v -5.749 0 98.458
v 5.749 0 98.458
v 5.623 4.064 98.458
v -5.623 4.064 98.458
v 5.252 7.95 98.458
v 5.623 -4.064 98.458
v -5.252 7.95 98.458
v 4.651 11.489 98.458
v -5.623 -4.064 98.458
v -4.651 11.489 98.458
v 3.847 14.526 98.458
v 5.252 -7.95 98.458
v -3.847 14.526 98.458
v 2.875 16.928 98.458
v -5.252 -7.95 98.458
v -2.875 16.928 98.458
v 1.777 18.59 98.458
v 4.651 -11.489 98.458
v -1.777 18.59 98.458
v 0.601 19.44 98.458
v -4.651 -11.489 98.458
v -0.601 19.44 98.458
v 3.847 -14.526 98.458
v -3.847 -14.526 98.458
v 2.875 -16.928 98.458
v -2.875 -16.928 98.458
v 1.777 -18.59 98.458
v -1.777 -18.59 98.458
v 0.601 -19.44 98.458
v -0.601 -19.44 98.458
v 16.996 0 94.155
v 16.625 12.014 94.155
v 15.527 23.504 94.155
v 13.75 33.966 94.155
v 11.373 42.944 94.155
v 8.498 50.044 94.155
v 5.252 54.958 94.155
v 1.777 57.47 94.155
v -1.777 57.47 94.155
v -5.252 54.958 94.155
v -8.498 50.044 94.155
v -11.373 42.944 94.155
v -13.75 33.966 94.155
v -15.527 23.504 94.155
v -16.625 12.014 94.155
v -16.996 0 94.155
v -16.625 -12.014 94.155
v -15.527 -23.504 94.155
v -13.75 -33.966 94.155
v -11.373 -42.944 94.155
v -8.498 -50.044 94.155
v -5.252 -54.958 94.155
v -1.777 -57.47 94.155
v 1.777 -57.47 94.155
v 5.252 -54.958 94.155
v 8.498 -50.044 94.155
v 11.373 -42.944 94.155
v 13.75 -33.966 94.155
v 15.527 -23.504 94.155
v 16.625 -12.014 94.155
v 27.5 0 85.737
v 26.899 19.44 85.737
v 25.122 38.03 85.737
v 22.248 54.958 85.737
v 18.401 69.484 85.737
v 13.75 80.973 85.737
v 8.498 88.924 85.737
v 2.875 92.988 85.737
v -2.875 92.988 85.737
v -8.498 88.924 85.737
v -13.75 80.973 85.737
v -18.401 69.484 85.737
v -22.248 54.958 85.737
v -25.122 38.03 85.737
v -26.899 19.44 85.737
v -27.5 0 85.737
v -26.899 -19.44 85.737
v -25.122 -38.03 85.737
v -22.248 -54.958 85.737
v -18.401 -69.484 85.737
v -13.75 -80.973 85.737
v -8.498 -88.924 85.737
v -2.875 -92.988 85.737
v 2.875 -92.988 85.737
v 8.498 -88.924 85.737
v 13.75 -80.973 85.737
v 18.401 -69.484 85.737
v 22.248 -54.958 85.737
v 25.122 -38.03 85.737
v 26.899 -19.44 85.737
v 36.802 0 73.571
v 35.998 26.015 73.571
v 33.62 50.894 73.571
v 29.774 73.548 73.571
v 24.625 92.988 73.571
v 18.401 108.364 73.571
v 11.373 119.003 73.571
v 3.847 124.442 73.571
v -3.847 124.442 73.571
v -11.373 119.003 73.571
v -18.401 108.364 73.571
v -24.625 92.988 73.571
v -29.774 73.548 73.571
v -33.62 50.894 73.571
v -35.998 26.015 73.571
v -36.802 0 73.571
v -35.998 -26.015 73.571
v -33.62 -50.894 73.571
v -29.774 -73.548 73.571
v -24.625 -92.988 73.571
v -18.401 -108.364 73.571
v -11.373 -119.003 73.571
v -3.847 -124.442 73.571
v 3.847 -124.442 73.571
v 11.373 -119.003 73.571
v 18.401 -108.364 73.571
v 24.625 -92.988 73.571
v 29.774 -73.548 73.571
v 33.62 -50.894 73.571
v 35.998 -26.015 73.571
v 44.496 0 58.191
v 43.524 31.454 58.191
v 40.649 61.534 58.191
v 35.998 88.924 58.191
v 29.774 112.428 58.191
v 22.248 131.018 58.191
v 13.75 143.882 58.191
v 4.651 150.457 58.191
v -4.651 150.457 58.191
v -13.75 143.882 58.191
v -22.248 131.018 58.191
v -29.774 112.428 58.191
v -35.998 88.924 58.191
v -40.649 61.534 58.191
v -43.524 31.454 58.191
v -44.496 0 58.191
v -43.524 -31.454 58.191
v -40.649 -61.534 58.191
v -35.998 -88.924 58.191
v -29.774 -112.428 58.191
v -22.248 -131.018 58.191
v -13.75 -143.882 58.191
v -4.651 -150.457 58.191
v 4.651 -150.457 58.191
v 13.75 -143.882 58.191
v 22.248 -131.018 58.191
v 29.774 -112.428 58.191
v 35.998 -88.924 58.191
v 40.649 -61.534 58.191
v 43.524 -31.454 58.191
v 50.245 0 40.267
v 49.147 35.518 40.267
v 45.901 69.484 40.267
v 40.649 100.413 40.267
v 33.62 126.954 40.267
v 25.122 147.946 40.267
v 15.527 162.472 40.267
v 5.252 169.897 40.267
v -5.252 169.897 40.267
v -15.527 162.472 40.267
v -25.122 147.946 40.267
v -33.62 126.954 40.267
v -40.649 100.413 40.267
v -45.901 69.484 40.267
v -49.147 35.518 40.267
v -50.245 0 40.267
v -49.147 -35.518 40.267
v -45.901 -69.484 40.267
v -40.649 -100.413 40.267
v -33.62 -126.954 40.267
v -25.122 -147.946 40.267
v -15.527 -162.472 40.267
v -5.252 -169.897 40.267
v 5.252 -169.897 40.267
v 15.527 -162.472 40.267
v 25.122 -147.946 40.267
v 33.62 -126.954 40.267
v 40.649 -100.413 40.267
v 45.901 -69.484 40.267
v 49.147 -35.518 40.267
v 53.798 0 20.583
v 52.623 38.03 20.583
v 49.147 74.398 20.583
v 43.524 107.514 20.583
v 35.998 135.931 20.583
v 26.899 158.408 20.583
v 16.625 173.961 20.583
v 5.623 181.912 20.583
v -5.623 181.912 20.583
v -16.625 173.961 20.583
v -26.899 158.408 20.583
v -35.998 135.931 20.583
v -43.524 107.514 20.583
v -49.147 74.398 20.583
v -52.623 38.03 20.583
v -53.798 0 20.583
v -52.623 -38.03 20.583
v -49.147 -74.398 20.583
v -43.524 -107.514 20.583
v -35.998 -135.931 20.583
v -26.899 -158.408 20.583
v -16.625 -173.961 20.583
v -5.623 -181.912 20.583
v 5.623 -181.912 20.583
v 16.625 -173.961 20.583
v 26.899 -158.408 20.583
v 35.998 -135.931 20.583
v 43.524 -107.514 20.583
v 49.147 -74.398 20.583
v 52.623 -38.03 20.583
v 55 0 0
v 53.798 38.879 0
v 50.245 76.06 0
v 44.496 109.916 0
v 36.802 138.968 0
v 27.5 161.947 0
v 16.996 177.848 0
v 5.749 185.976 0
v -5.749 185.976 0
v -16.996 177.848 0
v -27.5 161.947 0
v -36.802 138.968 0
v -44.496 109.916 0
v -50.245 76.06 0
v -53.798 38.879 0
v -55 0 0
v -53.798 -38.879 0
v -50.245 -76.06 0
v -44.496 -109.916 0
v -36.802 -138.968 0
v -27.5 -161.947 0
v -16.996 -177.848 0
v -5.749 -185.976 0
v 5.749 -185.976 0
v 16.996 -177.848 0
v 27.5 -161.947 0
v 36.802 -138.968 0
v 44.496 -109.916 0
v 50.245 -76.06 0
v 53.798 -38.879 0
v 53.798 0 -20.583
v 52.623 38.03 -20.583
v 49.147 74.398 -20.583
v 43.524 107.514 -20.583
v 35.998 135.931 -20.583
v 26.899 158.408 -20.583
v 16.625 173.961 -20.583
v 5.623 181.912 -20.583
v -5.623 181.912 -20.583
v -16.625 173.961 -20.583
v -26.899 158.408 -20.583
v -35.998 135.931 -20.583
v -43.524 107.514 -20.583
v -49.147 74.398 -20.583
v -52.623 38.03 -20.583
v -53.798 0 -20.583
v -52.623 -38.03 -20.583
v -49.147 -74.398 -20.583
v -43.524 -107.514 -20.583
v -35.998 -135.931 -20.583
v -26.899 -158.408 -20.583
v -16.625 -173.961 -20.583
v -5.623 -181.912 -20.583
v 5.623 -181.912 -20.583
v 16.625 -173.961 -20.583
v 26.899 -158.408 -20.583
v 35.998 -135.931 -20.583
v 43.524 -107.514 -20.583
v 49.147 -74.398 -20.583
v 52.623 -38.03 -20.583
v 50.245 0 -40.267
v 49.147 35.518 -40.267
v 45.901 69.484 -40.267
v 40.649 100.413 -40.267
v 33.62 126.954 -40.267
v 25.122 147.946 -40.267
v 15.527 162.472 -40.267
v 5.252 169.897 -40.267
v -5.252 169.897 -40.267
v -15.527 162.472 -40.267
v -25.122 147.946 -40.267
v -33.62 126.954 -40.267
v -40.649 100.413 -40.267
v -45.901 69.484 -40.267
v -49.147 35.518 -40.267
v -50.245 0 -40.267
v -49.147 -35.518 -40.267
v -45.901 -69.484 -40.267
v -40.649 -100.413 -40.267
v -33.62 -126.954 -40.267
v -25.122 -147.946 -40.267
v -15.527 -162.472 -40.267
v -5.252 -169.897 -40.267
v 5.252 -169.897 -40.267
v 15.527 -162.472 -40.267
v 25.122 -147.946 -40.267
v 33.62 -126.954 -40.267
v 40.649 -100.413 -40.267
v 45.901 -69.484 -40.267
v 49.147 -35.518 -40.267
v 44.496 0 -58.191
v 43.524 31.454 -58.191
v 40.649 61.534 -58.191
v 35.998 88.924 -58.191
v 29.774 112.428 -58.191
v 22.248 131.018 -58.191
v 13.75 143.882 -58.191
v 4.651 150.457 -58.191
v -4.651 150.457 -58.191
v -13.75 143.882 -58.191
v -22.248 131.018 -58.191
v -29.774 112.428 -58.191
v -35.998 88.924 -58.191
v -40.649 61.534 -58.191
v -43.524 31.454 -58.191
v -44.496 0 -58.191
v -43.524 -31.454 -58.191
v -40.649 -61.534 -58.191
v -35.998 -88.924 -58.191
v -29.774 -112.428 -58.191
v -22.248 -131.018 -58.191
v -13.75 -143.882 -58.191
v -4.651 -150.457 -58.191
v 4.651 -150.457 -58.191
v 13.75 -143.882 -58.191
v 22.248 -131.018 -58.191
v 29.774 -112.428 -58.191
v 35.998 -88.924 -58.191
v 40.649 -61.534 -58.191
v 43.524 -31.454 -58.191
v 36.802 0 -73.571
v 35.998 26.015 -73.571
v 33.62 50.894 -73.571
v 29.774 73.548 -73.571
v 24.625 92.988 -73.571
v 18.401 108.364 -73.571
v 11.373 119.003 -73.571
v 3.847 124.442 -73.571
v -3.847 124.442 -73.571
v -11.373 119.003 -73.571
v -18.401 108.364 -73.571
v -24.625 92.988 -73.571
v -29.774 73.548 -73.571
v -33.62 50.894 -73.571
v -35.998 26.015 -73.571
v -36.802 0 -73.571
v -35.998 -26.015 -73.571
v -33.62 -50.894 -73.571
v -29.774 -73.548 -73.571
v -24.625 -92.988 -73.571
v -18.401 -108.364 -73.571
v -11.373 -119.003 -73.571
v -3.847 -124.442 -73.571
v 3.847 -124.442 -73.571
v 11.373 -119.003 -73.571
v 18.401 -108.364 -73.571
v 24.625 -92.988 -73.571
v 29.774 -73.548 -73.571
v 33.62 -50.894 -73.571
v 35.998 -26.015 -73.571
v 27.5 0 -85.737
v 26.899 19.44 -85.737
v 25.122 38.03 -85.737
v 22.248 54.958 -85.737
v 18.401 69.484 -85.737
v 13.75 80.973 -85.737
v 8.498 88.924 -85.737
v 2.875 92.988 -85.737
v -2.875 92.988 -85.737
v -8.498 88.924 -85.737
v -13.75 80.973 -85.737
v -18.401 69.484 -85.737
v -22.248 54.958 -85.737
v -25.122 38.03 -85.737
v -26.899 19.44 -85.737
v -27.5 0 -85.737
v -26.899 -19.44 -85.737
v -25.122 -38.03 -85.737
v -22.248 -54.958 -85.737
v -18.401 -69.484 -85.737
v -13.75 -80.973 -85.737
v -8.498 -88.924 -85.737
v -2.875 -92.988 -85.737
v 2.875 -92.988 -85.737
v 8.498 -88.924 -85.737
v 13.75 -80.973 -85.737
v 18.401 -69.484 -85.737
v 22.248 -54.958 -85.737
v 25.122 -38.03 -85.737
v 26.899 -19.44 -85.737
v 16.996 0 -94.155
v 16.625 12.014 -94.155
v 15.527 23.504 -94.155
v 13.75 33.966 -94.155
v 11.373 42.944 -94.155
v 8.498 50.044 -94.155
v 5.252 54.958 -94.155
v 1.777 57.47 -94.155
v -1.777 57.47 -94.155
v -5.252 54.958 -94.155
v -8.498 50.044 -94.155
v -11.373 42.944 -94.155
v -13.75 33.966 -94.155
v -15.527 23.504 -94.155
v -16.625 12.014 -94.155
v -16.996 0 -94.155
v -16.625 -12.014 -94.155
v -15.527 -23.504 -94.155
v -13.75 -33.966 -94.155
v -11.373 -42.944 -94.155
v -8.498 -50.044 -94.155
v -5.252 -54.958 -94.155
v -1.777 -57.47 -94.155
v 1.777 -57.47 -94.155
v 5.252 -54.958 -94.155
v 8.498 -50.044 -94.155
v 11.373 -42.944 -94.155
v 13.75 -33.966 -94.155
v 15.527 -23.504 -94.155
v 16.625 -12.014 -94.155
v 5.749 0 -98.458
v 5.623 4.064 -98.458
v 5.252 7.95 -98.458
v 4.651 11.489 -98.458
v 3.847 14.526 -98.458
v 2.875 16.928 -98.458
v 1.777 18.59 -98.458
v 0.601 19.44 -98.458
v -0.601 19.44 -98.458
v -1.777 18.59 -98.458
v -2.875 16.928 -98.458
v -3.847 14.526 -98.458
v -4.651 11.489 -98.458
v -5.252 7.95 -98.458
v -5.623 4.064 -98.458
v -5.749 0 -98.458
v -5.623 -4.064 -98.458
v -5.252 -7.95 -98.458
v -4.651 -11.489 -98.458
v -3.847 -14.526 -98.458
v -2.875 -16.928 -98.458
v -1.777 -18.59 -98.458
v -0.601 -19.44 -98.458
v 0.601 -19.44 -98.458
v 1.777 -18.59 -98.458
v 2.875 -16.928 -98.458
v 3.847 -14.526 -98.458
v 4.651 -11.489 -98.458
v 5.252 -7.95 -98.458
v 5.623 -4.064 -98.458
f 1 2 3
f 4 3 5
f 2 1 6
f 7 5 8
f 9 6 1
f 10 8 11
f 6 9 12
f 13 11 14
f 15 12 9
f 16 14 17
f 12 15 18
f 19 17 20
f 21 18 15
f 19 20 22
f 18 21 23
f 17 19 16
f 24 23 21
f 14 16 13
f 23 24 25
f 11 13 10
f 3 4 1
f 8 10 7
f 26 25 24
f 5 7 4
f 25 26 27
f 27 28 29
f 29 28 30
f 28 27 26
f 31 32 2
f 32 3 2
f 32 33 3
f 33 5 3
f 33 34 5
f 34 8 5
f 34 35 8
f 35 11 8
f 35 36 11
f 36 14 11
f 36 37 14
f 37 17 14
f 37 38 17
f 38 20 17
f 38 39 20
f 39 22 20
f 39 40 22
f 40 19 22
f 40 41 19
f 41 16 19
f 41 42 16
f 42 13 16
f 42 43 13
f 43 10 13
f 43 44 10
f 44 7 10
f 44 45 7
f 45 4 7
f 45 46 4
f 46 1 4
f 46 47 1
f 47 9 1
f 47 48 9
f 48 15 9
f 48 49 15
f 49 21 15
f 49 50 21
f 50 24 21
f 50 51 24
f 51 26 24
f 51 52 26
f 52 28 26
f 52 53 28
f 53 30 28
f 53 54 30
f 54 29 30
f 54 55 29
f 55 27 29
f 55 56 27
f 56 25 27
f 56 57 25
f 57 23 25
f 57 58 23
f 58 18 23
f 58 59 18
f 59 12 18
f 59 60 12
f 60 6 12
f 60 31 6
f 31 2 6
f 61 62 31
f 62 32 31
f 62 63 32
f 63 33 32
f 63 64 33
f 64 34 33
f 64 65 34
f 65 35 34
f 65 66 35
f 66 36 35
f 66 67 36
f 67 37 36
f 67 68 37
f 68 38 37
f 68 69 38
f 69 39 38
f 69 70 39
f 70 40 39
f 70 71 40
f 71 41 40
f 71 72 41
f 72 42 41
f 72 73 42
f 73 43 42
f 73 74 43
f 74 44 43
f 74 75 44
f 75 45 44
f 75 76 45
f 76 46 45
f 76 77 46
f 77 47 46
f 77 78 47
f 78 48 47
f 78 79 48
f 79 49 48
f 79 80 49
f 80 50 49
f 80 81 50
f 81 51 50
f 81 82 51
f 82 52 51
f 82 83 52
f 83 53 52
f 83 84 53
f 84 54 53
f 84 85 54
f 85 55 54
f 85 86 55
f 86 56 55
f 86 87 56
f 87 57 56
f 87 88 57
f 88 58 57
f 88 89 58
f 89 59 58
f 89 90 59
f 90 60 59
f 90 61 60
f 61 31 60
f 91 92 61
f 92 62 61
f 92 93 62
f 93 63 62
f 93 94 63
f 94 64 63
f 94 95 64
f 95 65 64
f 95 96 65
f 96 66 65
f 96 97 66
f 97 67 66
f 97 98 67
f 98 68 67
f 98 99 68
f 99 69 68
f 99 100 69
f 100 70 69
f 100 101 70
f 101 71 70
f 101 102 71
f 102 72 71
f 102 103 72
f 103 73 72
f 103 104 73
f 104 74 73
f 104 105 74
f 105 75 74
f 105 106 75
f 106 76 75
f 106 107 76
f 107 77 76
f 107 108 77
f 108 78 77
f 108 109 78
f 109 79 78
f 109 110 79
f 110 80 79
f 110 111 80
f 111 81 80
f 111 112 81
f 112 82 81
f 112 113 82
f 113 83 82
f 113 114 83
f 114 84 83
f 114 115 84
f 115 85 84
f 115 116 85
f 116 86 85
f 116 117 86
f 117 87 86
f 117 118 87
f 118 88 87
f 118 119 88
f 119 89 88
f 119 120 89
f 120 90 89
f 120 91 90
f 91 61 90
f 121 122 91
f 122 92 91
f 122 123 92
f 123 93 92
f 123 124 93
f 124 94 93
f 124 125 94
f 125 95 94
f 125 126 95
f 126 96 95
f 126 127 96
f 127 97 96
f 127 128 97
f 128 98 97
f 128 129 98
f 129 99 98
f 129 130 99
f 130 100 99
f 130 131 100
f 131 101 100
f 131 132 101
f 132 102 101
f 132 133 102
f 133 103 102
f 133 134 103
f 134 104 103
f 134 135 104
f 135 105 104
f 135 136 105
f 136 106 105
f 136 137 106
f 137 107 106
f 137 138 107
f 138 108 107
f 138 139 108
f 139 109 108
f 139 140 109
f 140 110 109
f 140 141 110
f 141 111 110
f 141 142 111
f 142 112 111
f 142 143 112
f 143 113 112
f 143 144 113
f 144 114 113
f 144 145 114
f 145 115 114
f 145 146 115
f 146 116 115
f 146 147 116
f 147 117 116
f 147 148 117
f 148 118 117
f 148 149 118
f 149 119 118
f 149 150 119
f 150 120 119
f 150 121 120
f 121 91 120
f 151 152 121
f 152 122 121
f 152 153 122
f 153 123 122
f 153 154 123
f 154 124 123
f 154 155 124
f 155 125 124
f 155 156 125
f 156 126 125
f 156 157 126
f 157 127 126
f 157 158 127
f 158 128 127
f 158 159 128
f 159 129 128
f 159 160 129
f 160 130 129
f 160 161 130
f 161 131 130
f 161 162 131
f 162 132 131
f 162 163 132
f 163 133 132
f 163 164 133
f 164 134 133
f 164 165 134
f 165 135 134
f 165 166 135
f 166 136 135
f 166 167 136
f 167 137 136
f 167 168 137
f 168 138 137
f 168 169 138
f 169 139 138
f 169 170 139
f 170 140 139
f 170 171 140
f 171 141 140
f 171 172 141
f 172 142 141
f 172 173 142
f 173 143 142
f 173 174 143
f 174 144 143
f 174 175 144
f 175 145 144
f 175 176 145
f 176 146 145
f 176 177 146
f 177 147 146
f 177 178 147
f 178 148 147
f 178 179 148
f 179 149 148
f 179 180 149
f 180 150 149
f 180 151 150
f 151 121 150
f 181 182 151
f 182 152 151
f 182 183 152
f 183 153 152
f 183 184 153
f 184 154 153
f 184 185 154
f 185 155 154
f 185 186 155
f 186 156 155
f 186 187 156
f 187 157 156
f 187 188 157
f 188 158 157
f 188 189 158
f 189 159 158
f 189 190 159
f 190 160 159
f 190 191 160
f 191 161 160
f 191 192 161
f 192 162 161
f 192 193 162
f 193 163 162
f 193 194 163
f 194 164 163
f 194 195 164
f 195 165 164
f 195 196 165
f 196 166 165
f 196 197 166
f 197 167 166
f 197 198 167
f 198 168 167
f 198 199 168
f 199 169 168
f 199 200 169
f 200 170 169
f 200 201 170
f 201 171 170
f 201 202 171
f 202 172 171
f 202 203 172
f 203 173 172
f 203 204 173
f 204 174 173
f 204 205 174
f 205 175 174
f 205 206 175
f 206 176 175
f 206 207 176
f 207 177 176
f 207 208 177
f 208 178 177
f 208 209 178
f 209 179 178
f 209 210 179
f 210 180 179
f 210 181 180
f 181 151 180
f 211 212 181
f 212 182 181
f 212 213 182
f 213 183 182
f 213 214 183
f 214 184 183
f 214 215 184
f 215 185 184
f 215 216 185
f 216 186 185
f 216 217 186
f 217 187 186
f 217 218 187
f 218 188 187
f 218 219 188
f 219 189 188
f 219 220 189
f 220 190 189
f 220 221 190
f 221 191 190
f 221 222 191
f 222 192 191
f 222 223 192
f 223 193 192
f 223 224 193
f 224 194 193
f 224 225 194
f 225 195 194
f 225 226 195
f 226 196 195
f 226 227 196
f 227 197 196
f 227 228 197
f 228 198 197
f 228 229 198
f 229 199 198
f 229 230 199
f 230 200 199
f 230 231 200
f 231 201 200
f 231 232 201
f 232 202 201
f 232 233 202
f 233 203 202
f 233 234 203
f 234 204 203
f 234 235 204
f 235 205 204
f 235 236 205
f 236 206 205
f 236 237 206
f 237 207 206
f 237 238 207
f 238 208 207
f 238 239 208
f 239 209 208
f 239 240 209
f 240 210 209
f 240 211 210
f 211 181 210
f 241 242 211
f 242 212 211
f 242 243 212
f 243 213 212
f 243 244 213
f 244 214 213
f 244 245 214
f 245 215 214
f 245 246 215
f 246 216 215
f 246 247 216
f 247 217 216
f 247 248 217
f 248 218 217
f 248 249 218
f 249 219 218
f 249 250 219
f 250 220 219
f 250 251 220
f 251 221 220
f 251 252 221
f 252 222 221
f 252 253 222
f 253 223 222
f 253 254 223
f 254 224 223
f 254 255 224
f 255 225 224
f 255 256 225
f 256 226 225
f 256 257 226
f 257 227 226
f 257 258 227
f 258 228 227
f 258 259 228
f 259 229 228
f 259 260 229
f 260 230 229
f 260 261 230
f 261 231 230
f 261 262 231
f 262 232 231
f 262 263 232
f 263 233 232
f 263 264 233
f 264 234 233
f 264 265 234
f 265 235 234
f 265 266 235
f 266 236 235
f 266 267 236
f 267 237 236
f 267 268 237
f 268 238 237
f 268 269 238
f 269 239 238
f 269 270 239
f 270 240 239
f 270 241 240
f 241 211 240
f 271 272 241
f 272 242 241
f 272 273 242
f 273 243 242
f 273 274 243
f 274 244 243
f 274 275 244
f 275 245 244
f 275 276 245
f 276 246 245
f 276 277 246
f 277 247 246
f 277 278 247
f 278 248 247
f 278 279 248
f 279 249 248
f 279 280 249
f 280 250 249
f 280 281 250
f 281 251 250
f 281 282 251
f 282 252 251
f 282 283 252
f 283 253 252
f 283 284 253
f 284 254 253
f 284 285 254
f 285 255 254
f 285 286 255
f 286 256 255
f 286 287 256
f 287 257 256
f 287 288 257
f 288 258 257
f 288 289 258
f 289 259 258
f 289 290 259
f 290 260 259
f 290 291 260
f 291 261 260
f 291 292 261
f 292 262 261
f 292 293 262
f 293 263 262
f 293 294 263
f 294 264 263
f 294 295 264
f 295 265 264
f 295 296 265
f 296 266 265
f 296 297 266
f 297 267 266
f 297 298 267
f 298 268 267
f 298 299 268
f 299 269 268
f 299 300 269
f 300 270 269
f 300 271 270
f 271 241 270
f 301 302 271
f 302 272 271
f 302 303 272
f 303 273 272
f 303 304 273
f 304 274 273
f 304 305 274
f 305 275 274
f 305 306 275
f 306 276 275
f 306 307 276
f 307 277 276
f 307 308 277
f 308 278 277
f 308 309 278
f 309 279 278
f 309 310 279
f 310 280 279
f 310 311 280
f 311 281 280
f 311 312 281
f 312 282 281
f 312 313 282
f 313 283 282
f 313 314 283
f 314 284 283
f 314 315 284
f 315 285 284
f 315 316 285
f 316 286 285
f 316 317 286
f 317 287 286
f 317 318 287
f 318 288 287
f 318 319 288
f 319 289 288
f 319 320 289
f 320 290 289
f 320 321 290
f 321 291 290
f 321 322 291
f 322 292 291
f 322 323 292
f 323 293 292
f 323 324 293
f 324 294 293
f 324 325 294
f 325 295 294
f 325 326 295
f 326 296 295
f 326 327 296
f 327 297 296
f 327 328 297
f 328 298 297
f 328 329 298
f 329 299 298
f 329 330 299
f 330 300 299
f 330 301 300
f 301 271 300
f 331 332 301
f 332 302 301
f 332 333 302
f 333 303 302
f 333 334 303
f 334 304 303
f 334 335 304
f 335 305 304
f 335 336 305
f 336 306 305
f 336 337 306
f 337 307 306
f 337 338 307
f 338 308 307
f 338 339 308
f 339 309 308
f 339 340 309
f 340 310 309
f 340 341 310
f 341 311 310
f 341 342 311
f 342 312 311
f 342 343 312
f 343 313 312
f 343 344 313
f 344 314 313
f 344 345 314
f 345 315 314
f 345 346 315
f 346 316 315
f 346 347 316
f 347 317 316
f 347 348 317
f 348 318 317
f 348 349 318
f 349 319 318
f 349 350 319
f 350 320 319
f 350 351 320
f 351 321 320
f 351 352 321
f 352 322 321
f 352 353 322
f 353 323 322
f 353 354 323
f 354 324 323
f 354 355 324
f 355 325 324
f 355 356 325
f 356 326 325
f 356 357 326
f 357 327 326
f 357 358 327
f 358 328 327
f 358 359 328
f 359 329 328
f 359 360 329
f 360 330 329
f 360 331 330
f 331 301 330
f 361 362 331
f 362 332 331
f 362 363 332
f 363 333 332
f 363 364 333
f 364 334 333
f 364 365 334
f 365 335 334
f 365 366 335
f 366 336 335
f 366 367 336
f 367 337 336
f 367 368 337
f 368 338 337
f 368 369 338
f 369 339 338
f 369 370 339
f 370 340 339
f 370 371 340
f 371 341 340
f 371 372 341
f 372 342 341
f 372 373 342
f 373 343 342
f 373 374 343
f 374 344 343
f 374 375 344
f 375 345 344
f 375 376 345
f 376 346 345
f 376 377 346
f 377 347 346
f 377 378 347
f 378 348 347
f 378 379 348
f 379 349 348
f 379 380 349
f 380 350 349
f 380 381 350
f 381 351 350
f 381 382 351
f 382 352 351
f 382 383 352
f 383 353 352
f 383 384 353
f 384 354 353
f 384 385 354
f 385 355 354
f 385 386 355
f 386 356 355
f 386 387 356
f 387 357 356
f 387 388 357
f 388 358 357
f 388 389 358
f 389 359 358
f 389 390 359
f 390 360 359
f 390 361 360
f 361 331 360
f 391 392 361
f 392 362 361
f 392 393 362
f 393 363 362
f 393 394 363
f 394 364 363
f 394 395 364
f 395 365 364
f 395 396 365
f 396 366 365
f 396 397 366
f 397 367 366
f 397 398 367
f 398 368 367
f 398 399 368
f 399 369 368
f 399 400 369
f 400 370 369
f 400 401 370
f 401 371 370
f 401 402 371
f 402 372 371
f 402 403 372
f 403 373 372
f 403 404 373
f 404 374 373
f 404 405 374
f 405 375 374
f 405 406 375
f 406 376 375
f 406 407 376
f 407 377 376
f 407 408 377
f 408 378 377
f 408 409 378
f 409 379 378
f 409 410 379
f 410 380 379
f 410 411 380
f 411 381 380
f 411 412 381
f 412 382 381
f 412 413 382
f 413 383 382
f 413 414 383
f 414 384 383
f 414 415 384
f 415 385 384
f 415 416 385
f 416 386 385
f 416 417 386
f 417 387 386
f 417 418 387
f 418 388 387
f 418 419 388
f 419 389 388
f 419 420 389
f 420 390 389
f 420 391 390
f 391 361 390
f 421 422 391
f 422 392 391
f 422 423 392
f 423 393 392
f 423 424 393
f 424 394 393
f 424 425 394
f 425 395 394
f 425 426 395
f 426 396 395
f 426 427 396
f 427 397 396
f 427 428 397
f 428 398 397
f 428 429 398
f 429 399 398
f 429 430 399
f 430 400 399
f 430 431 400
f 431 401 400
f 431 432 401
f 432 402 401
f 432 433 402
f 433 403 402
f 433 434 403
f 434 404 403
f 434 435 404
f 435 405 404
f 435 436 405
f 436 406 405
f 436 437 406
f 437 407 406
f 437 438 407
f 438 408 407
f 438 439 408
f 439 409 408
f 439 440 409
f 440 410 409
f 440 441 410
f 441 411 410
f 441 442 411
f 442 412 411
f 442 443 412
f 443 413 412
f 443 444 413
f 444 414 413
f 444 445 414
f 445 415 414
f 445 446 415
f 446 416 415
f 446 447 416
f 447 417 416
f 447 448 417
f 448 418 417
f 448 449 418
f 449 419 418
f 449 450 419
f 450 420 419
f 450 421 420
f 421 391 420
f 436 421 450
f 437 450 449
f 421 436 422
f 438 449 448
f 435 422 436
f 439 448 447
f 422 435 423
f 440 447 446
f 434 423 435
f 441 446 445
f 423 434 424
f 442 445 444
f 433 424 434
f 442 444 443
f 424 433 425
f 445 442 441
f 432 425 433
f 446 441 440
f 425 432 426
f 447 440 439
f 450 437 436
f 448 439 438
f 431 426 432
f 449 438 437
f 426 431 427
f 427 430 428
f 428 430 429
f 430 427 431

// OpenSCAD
// Generated by SolidPython 1.0.1 on 2020-07-29 00:46:46


scale(v = [5, 17, 9]) {
	sphere(r = 11);
}
/***********************************************
*********      SolidPython code:      **********
************************************************
 
# import packages: SolidPython
from solid import *
from solid.utils import *
from itertools import chain, combinations, permutations


class Resize:

    def __init__(self, scad_file):
        self.scad_file = scad_file
        #self.scad_file = import_scad(scad_file)
        # cone/cylinder param:
        self.r1 = 0
        self.r2 = 0
        self.h = 0
        # rectangular prism param:
        self.w = 0
        self.l = 0
        # ellipse param:
        self.r = 0

    # import OpenScad code (file name corresponds to shape)


    # classify shape + parameters
    def assign(self, param1, param2, param3):
        if self.scad_file == 'cone.scad':
            self.r1 = param1
            self.r2 = param2
            self.h = param3
        elif self.scad_file == 'cylinder.scad':
            self.r1 = param1
            self.r2 = param2
            self.h = param3
        elif self.scad_file == 'rectangularPrism.scad':
            self.h = param1
            self.l = param2
            self.w = param3
        else:
            self.r = param1
            self.h = param2

    # resize parameters
    def iterate(self):
        x = range(3, 20, 2)
        i = 1
        if self.scad_file == 'cone.scad':
            tempList = list(permutations(x, 2))
            for temp in tempList:
                param1 = temp[0]
                param2 = temp[1]
                filepath = 'produced_scad_files/' + 'cone' + str(param1) + '_' + str(param2) + '_' + '.scad'
                scad_render_to_file(cylinder(h=param1, r1=param2, r2=0), filepath)

        elif self.scad_file == 'cylinder.scad':
            tempList = list(permutations(x, 3))
            for temp in tempList:
                param1 = temp[0]
                param2 = temp[1]
                filepath = 'produced_scad_files/' + 'cylinder' + str(param1) + '_' + str(param2) + '_' + '.scad'
                scad_render_to_file(cylinder(h=param1, r1=param2, r2=param2), filepath)

        elif self.scad_file == 'rectangularPrism.scad':
            tempList = list(permutations(x, 3))
            for temp in tempList:
                param1 = temp[0]
                param2 = temp[1]
                param3 = temp[2]
                filepath = 'produced_scad_files/' + 'rectangularPrism' + str(param1) + '_' + str(param2) + '_' + str(
                    param3) + '.scad'
                scad_render_to_file(cube(size=(param1, param2, param3)), filepath)

        elif self.scad_file == 'ellipse.scad':
            tempList = list(permutations(x, 4))
            for temp in tempList:
                param1 = temp[0]
                param2 = temp[1]
                param3 = temp[2]
                param4 = temp[3]
                filepath = 'produced_scad_files/' + 'ellipse' + str(param1) + '_' + str(param2) + '_' + str(param3) + '_' + str(param4) + '.scad'
                scad_render_to_file(scale([param1, param2, param3])(sphere(r=param4)), filepath)

    def render_to_scadfile(self):
        scad_render_to_file(scad, 'example.scad') 
 
************************************************/
